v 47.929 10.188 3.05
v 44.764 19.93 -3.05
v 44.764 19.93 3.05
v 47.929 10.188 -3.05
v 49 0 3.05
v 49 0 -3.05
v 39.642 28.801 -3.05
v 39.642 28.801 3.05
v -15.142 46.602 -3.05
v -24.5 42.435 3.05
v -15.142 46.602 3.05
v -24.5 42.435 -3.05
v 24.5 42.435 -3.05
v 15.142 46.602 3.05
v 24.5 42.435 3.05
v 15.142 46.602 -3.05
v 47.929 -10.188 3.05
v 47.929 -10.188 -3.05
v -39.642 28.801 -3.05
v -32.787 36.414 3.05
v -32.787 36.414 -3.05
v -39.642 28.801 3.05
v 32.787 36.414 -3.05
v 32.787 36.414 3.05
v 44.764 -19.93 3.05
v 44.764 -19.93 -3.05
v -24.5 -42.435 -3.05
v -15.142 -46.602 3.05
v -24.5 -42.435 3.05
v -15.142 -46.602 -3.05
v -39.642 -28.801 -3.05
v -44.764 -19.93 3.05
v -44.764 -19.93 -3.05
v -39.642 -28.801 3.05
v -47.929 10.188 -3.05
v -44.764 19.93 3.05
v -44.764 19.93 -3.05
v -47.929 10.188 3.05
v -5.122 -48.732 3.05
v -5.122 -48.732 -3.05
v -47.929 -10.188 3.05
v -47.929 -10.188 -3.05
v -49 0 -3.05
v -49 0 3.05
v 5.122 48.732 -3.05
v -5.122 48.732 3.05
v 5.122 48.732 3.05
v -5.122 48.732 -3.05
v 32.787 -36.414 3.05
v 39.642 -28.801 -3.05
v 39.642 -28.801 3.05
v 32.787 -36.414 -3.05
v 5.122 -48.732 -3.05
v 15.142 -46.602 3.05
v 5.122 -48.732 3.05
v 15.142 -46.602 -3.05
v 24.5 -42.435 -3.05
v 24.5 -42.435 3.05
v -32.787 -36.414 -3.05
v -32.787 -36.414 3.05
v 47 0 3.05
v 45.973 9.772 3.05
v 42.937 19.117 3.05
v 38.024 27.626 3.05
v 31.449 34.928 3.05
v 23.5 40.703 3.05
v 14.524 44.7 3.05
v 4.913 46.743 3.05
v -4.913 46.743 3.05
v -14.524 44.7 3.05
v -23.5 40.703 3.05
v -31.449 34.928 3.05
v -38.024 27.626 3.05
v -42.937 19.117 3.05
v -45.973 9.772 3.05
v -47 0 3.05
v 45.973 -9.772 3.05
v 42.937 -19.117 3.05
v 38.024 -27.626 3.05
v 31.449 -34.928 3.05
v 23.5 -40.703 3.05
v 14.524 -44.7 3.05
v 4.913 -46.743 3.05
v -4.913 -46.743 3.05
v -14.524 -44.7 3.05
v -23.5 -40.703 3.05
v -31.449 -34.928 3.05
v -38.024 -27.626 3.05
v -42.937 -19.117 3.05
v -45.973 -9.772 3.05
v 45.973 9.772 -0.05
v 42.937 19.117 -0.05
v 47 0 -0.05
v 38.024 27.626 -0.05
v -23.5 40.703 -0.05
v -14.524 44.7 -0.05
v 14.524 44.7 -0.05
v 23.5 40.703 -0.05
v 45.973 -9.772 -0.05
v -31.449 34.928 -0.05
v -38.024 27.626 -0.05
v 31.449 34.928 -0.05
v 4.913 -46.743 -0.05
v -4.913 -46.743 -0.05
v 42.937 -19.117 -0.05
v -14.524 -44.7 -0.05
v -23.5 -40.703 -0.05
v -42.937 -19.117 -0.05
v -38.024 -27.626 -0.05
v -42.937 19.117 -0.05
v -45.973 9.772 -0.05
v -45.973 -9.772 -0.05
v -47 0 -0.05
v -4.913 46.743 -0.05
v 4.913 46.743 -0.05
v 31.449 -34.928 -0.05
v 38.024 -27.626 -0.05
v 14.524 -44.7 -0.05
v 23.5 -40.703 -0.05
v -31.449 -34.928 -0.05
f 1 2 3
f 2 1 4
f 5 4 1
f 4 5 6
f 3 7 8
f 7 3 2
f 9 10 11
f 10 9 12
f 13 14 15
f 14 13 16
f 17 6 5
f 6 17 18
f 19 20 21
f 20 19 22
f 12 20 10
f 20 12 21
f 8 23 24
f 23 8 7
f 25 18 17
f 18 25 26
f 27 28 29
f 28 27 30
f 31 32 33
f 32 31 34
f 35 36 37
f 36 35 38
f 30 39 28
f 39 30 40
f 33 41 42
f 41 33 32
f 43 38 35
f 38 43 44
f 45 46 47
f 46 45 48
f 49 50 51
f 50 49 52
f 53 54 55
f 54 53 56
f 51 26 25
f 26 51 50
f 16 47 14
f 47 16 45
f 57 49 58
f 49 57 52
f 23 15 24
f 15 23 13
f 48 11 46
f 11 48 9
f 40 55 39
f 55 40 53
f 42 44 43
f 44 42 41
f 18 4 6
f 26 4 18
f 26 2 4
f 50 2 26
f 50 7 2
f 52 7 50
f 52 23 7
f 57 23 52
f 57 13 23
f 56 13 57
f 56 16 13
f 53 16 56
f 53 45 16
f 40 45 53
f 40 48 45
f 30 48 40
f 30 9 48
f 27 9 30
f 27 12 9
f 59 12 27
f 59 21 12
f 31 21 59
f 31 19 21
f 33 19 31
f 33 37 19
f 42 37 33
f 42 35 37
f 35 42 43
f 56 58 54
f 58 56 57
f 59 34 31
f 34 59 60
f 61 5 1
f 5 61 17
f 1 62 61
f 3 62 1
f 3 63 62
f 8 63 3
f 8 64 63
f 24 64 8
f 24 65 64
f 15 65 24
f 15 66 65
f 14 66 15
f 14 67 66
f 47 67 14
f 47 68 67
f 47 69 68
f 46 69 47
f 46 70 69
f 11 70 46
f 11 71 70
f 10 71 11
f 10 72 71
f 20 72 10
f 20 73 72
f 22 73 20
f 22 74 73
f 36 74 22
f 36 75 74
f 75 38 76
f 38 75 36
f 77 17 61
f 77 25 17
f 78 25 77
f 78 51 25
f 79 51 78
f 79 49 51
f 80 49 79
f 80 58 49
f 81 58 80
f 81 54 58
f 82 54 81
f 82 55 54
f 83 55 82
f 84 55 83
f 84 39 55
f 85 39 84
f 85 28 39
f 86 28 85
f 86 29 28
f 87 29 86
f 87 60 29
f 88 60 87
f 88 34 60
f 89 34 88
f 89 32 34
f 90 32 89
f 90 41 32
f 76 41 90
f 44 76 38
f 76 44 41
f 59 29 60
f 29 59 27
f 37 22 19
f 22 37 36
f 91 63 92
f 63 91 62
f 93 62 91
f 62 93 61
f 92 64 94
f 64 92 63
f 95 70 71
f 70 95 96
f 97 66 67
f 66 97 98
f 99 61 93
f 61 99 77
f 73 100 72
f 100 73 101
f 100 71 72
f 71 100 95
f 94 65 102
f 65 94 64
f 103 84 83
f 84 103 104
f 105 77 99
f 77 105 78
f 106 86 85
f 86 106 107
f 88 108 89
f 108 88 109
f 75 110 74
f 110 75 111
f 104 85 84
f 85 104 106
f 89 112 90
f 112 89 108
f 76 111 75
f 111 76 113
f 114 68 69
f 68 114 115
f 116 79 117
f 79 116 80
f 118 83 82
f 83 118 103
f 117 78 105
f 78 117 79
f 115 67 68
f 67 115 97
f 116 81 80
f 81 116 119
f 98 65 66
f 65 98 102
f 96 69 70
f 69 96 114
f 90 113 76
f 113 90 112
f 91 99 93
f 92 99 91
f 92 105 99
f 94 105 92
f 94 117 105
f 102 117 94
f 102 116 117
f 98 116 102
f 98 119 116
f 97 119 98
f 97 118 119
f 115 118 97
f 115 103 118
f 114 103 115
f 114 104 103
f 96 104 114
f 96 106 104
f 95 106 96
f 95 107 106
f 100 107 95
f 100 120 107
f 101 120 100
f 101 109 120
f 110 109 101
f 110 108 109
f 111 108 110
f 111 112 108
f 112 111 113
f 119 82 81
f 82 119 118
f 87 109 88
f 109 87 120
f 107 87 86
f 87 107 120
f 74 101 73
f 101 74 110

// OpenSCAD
BenroLensAdapterDiameter = 94;
BenroLensAdapterThickness = 4.1;
lensCapThickness = 2;

module lensAdapter() {
cylinder(h = BenroLensAdapterThickness, d = BenroLensAdapterDiameter, center = true);
}

module lensCap() {
    difference () {
        cylinder(h = BenroLensAdapterThickness+lensCapThickness, d = BenroLensAdapterDiameter+2*lensCapThickness, center = true);
        translate([0,0,lensCapThickness])
            lensAdapter();
    }
}

//lensAdapter();
lensCap();
